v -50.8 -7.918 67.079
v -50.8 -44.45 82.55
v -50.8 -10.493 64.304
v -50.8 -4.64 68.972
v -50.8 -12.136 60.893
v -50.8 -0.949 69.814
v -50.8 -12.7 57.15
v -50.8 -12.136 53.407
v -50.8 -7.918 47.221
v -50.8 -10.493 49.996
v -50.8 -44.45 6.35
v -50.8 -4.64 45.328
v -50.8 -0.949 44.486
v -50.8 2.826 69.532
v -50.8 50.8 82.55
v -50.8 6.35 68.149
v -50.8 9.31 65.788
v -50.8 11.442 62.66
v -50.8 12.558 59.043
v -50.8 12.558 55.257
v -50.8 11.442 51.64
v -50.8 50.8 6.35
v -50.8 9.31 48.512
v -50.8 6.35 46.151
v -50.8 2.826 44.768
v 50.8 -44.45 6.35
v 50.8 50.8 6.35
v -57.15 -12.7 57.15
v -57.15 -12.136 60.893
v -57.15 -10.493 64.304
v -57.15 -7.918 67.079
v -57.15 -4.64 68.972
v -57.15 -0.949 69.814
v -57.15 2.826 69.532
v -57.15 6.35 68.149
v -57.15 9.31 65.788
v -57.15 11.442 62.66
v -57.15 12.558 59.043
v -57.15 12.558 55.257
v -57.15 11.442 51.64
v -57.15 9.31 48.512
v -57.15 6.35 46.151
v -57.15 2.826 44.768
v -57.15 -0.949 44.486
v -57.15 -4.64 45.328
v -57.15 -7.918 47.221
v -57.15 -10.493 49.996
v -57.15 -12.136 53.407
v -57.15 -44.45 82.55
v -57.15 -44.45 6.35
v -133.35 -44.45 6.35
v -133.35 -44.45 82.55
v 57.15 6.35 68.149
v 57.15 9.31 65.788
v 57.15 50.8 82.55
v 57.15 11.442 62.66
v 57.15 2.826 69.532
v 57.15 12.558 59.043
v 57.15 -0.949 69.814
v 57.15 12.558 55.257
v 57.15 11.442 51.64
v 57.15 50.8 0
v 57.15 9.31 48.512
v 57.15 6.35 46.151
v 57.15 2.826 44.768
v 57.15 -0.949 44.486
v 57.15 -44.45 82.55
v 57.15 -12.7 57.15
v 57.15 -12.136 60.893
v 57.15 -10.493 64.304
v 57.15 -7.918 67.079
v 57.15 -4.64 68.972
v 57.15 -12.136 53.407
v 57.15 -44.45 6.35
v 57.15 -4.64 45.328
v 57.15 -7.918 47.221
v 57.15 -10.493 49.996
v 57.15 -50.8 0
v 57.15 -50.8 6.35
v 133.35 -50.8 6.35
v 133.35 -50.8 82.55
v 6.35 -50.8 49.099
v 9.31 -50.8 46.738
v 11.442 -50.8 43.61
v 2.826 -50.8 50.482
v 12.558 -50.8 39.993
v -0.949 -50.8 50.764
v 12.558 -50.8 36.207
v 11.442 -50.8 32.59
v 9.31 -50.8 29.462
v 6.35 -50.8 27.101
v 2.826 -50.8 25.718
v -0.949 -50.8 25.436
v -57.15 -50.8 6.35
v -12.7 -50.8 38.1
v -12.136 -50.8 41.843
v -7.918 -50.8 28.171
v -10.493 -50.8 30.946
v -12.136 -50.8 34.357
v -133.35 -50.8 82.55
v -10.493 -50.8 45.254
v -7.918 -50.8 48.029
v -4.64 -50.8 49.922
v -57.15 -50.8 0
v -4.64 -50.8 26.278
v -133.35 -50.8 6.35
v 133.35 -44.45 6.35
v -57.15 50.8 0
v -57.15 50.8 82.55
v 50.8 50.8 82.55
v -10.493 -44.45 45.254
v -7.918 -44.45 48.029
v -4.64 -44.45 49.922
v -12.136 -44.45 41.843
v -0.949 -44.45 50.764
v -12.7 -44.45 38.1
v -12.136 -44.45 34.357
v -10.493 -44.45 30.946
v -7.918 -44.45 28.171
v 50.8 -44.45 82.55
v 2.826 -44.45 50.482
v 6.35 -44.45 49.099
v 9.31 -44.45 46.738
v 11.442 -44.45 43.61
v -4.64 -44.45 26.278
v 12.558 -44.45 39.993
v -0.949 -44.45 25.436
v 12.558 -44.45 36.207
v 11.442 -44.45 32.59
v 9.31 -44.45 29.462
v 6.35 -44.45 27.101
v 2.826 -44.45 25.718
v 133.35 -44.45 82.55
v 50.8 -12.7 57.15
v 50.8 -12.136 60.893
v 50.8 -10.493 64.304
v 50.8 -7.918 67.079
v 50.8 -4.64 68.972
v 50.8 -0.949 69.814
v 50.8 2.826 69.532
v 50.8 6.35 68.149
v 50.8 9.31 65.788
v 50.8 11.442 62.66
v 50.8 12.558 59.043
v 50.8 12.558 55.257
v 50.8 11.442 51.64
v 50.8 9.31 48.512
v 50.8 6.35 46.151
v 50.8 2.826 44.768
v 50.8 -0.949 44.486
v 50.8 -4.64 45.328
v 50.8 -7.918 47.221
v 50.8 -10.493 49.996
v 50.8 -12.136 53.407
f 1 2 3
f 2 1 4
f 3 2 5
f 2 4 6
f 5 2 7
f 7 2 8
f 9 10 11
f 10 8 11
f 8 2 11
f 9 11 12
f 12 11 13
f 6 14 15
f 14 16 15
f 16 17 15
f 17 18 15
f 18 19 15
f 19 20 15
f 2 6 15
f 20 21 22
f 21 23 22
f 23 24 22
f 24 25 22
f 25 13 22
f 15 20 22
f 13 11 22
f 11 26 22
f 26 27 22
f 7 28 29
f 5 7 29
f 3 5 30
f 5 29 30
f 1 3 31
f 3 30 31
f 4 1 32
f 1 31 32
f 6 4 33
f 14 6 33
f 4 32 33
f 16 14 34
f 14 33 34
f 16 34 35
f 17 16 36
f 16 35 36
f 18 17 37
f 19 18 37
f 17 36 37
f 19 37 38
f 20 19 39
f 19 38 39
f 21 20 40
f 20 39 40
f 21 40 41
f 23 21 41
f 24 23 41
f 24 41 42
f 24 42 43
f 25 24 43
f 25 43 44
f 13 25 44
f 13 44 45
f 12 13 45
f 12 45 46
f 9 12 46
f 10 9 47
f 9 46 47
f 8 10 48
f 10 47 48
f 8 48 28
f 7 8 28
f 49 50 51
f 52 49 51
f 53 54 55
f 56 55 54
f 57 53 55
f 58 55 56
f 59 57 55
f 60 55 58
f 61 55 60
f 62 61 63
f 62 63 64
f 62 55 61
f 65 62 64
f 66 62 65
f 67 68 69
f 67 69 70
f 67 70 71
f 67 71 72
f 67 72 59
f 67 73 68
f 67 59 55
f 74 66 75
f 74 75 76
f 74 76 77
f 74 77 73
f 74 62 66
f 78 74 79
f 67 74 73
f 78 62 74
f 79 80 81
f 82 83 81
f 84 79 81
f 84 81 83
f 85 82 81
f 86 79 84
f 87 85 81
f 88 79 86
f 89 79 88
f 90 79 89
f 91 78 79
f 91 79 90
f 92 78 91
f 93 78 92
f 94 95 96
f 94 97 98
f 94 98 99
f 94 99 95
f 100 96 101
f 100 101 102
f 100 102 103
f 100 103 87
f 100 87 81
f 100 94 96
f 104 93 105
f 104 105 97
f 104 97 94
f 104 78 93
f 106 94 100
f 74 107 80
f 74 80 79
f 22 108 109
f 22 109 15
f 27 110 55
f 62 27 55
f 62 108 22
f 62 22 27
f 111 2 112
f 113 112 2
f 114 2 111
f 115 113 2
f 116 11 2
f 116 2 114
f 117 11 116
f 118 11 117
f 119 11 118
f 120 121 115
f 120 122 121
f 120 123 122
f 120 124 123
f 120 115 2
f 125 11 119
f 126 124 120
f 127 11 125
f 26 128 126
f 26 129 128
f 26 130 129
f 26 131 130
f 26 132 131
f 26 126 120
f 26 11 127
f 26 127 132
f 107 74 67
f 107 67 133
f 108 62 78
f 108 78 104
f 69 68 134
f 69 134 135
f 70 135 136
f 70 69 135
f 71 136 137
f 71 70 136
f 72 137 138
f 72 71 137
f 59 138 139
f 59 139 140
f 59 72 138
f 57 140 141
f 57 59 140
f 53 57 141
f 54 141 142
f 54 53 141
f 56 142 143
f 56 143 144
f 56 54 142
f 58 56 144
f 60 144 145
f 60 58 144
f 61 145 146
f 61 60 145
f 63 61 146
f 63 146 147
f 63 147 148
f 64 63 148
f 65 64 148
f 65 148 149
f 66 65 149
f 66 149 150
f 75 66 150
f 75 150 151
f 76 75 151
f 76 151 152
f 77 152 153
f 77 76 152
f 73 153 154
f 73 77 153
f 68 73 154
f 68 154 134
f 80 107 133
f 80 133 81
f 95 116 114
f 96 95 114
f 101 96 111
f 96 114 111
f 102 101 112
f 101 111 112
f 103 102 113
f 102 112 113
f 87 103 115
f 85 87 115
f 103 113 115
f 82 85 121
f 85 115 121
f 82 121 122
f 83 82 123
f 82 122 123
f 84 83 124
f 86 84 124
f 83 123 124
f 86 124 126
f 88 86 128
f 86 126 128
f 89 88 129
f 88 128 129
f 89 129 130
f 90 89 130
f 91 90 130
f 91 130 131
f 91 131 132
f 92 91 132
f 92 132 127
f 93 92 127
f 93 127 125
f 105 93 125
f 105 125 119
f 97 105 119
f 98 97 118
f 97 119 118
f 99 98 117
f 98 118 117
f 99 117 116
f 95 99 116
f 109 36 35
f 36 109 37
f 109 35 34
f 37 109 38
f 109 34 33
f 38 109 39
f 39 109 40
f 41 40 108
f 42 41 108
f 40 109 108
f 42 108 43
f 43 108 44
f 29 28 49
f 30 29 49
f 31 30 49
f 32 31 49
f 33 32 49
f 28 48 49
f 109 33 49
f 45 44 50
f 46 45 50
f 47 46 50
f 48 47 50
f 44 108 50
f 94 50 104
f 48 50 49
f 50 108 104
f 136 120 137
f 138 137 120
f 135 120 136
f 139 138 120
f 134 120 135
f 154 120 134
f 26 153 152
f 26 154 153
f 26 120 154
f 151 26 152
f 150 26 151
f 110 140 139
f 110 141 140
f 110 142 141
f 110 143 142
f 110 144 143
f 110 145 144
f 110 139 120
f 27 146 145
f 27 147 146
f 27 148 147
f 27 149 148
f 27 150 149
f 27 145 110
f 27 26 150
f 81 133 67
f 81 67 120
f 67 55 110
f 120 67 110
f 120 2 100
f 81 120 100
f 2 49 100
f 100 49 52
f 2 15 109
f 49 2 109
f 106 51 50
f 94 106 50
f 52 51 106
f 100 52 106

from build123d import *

# Parameters (mm, degrees)
F0_W     = 57.15
F0_H     = 101.6
F1_DEPTH = 6.35
F3_DEPTH = 76.2
F4_R     = 12.7
F5_DEPTH = 6.35
F7_R     = 12.7
F8_DEPTH = 6.35


with BuildPart() as f1:
    # F0 (on Top) → F1 (new body)
    with BuildSketch(Plane.XY):
        with Locations((-28.575, 0)):
            Rectangle(F0_W, F0_H)
    extrude(amount=F1_DEPTH)

    # F2 (on face) → F3 (join)
    with BuildSketch(Plane.XY.offset(6.35)):
        Polygon((-50.8, 50.8), (-57.15, 50.8), (-57.15, -44.45), (-133.35, -44.45), (-133.35, -50.8), (0, -50.8), (0, -44.45), (-50.8, -44.45), align=None)
    extrude(amount=F3_DEPTH)

    # F4 (on face) → F5 (cut, through all)
    with BuildSketch(Plane(origin=(-57.15, 0, 0), x_dir=(0, -1, 0), z_dir=(-1, 0, 0))):
        with Locations((0, 57.15)):
            Circle(F4_R)
    extrude(amount=-F5_DEPTH, mode=Mode.SUBTRACT)

    # F6: F1 across plane


with BuildPart() as f1_1:
    add(f1.part)
    add(f1.part.mirror(Plane.YZ))

    # F7 (on face) → F8 (cut, through all)
    with BuildSketch(Plane(origin=(0, -44.45, 0), x_dir=(-1, 0, 0), z_dir=(0, 1, 0))):
        with Locations((0, 38.1)):
            Circle(F7_R)
    extrude(amount=-F8_DEPTH, mode=Mode.SUBTRACT)


solid = f1_1.part
